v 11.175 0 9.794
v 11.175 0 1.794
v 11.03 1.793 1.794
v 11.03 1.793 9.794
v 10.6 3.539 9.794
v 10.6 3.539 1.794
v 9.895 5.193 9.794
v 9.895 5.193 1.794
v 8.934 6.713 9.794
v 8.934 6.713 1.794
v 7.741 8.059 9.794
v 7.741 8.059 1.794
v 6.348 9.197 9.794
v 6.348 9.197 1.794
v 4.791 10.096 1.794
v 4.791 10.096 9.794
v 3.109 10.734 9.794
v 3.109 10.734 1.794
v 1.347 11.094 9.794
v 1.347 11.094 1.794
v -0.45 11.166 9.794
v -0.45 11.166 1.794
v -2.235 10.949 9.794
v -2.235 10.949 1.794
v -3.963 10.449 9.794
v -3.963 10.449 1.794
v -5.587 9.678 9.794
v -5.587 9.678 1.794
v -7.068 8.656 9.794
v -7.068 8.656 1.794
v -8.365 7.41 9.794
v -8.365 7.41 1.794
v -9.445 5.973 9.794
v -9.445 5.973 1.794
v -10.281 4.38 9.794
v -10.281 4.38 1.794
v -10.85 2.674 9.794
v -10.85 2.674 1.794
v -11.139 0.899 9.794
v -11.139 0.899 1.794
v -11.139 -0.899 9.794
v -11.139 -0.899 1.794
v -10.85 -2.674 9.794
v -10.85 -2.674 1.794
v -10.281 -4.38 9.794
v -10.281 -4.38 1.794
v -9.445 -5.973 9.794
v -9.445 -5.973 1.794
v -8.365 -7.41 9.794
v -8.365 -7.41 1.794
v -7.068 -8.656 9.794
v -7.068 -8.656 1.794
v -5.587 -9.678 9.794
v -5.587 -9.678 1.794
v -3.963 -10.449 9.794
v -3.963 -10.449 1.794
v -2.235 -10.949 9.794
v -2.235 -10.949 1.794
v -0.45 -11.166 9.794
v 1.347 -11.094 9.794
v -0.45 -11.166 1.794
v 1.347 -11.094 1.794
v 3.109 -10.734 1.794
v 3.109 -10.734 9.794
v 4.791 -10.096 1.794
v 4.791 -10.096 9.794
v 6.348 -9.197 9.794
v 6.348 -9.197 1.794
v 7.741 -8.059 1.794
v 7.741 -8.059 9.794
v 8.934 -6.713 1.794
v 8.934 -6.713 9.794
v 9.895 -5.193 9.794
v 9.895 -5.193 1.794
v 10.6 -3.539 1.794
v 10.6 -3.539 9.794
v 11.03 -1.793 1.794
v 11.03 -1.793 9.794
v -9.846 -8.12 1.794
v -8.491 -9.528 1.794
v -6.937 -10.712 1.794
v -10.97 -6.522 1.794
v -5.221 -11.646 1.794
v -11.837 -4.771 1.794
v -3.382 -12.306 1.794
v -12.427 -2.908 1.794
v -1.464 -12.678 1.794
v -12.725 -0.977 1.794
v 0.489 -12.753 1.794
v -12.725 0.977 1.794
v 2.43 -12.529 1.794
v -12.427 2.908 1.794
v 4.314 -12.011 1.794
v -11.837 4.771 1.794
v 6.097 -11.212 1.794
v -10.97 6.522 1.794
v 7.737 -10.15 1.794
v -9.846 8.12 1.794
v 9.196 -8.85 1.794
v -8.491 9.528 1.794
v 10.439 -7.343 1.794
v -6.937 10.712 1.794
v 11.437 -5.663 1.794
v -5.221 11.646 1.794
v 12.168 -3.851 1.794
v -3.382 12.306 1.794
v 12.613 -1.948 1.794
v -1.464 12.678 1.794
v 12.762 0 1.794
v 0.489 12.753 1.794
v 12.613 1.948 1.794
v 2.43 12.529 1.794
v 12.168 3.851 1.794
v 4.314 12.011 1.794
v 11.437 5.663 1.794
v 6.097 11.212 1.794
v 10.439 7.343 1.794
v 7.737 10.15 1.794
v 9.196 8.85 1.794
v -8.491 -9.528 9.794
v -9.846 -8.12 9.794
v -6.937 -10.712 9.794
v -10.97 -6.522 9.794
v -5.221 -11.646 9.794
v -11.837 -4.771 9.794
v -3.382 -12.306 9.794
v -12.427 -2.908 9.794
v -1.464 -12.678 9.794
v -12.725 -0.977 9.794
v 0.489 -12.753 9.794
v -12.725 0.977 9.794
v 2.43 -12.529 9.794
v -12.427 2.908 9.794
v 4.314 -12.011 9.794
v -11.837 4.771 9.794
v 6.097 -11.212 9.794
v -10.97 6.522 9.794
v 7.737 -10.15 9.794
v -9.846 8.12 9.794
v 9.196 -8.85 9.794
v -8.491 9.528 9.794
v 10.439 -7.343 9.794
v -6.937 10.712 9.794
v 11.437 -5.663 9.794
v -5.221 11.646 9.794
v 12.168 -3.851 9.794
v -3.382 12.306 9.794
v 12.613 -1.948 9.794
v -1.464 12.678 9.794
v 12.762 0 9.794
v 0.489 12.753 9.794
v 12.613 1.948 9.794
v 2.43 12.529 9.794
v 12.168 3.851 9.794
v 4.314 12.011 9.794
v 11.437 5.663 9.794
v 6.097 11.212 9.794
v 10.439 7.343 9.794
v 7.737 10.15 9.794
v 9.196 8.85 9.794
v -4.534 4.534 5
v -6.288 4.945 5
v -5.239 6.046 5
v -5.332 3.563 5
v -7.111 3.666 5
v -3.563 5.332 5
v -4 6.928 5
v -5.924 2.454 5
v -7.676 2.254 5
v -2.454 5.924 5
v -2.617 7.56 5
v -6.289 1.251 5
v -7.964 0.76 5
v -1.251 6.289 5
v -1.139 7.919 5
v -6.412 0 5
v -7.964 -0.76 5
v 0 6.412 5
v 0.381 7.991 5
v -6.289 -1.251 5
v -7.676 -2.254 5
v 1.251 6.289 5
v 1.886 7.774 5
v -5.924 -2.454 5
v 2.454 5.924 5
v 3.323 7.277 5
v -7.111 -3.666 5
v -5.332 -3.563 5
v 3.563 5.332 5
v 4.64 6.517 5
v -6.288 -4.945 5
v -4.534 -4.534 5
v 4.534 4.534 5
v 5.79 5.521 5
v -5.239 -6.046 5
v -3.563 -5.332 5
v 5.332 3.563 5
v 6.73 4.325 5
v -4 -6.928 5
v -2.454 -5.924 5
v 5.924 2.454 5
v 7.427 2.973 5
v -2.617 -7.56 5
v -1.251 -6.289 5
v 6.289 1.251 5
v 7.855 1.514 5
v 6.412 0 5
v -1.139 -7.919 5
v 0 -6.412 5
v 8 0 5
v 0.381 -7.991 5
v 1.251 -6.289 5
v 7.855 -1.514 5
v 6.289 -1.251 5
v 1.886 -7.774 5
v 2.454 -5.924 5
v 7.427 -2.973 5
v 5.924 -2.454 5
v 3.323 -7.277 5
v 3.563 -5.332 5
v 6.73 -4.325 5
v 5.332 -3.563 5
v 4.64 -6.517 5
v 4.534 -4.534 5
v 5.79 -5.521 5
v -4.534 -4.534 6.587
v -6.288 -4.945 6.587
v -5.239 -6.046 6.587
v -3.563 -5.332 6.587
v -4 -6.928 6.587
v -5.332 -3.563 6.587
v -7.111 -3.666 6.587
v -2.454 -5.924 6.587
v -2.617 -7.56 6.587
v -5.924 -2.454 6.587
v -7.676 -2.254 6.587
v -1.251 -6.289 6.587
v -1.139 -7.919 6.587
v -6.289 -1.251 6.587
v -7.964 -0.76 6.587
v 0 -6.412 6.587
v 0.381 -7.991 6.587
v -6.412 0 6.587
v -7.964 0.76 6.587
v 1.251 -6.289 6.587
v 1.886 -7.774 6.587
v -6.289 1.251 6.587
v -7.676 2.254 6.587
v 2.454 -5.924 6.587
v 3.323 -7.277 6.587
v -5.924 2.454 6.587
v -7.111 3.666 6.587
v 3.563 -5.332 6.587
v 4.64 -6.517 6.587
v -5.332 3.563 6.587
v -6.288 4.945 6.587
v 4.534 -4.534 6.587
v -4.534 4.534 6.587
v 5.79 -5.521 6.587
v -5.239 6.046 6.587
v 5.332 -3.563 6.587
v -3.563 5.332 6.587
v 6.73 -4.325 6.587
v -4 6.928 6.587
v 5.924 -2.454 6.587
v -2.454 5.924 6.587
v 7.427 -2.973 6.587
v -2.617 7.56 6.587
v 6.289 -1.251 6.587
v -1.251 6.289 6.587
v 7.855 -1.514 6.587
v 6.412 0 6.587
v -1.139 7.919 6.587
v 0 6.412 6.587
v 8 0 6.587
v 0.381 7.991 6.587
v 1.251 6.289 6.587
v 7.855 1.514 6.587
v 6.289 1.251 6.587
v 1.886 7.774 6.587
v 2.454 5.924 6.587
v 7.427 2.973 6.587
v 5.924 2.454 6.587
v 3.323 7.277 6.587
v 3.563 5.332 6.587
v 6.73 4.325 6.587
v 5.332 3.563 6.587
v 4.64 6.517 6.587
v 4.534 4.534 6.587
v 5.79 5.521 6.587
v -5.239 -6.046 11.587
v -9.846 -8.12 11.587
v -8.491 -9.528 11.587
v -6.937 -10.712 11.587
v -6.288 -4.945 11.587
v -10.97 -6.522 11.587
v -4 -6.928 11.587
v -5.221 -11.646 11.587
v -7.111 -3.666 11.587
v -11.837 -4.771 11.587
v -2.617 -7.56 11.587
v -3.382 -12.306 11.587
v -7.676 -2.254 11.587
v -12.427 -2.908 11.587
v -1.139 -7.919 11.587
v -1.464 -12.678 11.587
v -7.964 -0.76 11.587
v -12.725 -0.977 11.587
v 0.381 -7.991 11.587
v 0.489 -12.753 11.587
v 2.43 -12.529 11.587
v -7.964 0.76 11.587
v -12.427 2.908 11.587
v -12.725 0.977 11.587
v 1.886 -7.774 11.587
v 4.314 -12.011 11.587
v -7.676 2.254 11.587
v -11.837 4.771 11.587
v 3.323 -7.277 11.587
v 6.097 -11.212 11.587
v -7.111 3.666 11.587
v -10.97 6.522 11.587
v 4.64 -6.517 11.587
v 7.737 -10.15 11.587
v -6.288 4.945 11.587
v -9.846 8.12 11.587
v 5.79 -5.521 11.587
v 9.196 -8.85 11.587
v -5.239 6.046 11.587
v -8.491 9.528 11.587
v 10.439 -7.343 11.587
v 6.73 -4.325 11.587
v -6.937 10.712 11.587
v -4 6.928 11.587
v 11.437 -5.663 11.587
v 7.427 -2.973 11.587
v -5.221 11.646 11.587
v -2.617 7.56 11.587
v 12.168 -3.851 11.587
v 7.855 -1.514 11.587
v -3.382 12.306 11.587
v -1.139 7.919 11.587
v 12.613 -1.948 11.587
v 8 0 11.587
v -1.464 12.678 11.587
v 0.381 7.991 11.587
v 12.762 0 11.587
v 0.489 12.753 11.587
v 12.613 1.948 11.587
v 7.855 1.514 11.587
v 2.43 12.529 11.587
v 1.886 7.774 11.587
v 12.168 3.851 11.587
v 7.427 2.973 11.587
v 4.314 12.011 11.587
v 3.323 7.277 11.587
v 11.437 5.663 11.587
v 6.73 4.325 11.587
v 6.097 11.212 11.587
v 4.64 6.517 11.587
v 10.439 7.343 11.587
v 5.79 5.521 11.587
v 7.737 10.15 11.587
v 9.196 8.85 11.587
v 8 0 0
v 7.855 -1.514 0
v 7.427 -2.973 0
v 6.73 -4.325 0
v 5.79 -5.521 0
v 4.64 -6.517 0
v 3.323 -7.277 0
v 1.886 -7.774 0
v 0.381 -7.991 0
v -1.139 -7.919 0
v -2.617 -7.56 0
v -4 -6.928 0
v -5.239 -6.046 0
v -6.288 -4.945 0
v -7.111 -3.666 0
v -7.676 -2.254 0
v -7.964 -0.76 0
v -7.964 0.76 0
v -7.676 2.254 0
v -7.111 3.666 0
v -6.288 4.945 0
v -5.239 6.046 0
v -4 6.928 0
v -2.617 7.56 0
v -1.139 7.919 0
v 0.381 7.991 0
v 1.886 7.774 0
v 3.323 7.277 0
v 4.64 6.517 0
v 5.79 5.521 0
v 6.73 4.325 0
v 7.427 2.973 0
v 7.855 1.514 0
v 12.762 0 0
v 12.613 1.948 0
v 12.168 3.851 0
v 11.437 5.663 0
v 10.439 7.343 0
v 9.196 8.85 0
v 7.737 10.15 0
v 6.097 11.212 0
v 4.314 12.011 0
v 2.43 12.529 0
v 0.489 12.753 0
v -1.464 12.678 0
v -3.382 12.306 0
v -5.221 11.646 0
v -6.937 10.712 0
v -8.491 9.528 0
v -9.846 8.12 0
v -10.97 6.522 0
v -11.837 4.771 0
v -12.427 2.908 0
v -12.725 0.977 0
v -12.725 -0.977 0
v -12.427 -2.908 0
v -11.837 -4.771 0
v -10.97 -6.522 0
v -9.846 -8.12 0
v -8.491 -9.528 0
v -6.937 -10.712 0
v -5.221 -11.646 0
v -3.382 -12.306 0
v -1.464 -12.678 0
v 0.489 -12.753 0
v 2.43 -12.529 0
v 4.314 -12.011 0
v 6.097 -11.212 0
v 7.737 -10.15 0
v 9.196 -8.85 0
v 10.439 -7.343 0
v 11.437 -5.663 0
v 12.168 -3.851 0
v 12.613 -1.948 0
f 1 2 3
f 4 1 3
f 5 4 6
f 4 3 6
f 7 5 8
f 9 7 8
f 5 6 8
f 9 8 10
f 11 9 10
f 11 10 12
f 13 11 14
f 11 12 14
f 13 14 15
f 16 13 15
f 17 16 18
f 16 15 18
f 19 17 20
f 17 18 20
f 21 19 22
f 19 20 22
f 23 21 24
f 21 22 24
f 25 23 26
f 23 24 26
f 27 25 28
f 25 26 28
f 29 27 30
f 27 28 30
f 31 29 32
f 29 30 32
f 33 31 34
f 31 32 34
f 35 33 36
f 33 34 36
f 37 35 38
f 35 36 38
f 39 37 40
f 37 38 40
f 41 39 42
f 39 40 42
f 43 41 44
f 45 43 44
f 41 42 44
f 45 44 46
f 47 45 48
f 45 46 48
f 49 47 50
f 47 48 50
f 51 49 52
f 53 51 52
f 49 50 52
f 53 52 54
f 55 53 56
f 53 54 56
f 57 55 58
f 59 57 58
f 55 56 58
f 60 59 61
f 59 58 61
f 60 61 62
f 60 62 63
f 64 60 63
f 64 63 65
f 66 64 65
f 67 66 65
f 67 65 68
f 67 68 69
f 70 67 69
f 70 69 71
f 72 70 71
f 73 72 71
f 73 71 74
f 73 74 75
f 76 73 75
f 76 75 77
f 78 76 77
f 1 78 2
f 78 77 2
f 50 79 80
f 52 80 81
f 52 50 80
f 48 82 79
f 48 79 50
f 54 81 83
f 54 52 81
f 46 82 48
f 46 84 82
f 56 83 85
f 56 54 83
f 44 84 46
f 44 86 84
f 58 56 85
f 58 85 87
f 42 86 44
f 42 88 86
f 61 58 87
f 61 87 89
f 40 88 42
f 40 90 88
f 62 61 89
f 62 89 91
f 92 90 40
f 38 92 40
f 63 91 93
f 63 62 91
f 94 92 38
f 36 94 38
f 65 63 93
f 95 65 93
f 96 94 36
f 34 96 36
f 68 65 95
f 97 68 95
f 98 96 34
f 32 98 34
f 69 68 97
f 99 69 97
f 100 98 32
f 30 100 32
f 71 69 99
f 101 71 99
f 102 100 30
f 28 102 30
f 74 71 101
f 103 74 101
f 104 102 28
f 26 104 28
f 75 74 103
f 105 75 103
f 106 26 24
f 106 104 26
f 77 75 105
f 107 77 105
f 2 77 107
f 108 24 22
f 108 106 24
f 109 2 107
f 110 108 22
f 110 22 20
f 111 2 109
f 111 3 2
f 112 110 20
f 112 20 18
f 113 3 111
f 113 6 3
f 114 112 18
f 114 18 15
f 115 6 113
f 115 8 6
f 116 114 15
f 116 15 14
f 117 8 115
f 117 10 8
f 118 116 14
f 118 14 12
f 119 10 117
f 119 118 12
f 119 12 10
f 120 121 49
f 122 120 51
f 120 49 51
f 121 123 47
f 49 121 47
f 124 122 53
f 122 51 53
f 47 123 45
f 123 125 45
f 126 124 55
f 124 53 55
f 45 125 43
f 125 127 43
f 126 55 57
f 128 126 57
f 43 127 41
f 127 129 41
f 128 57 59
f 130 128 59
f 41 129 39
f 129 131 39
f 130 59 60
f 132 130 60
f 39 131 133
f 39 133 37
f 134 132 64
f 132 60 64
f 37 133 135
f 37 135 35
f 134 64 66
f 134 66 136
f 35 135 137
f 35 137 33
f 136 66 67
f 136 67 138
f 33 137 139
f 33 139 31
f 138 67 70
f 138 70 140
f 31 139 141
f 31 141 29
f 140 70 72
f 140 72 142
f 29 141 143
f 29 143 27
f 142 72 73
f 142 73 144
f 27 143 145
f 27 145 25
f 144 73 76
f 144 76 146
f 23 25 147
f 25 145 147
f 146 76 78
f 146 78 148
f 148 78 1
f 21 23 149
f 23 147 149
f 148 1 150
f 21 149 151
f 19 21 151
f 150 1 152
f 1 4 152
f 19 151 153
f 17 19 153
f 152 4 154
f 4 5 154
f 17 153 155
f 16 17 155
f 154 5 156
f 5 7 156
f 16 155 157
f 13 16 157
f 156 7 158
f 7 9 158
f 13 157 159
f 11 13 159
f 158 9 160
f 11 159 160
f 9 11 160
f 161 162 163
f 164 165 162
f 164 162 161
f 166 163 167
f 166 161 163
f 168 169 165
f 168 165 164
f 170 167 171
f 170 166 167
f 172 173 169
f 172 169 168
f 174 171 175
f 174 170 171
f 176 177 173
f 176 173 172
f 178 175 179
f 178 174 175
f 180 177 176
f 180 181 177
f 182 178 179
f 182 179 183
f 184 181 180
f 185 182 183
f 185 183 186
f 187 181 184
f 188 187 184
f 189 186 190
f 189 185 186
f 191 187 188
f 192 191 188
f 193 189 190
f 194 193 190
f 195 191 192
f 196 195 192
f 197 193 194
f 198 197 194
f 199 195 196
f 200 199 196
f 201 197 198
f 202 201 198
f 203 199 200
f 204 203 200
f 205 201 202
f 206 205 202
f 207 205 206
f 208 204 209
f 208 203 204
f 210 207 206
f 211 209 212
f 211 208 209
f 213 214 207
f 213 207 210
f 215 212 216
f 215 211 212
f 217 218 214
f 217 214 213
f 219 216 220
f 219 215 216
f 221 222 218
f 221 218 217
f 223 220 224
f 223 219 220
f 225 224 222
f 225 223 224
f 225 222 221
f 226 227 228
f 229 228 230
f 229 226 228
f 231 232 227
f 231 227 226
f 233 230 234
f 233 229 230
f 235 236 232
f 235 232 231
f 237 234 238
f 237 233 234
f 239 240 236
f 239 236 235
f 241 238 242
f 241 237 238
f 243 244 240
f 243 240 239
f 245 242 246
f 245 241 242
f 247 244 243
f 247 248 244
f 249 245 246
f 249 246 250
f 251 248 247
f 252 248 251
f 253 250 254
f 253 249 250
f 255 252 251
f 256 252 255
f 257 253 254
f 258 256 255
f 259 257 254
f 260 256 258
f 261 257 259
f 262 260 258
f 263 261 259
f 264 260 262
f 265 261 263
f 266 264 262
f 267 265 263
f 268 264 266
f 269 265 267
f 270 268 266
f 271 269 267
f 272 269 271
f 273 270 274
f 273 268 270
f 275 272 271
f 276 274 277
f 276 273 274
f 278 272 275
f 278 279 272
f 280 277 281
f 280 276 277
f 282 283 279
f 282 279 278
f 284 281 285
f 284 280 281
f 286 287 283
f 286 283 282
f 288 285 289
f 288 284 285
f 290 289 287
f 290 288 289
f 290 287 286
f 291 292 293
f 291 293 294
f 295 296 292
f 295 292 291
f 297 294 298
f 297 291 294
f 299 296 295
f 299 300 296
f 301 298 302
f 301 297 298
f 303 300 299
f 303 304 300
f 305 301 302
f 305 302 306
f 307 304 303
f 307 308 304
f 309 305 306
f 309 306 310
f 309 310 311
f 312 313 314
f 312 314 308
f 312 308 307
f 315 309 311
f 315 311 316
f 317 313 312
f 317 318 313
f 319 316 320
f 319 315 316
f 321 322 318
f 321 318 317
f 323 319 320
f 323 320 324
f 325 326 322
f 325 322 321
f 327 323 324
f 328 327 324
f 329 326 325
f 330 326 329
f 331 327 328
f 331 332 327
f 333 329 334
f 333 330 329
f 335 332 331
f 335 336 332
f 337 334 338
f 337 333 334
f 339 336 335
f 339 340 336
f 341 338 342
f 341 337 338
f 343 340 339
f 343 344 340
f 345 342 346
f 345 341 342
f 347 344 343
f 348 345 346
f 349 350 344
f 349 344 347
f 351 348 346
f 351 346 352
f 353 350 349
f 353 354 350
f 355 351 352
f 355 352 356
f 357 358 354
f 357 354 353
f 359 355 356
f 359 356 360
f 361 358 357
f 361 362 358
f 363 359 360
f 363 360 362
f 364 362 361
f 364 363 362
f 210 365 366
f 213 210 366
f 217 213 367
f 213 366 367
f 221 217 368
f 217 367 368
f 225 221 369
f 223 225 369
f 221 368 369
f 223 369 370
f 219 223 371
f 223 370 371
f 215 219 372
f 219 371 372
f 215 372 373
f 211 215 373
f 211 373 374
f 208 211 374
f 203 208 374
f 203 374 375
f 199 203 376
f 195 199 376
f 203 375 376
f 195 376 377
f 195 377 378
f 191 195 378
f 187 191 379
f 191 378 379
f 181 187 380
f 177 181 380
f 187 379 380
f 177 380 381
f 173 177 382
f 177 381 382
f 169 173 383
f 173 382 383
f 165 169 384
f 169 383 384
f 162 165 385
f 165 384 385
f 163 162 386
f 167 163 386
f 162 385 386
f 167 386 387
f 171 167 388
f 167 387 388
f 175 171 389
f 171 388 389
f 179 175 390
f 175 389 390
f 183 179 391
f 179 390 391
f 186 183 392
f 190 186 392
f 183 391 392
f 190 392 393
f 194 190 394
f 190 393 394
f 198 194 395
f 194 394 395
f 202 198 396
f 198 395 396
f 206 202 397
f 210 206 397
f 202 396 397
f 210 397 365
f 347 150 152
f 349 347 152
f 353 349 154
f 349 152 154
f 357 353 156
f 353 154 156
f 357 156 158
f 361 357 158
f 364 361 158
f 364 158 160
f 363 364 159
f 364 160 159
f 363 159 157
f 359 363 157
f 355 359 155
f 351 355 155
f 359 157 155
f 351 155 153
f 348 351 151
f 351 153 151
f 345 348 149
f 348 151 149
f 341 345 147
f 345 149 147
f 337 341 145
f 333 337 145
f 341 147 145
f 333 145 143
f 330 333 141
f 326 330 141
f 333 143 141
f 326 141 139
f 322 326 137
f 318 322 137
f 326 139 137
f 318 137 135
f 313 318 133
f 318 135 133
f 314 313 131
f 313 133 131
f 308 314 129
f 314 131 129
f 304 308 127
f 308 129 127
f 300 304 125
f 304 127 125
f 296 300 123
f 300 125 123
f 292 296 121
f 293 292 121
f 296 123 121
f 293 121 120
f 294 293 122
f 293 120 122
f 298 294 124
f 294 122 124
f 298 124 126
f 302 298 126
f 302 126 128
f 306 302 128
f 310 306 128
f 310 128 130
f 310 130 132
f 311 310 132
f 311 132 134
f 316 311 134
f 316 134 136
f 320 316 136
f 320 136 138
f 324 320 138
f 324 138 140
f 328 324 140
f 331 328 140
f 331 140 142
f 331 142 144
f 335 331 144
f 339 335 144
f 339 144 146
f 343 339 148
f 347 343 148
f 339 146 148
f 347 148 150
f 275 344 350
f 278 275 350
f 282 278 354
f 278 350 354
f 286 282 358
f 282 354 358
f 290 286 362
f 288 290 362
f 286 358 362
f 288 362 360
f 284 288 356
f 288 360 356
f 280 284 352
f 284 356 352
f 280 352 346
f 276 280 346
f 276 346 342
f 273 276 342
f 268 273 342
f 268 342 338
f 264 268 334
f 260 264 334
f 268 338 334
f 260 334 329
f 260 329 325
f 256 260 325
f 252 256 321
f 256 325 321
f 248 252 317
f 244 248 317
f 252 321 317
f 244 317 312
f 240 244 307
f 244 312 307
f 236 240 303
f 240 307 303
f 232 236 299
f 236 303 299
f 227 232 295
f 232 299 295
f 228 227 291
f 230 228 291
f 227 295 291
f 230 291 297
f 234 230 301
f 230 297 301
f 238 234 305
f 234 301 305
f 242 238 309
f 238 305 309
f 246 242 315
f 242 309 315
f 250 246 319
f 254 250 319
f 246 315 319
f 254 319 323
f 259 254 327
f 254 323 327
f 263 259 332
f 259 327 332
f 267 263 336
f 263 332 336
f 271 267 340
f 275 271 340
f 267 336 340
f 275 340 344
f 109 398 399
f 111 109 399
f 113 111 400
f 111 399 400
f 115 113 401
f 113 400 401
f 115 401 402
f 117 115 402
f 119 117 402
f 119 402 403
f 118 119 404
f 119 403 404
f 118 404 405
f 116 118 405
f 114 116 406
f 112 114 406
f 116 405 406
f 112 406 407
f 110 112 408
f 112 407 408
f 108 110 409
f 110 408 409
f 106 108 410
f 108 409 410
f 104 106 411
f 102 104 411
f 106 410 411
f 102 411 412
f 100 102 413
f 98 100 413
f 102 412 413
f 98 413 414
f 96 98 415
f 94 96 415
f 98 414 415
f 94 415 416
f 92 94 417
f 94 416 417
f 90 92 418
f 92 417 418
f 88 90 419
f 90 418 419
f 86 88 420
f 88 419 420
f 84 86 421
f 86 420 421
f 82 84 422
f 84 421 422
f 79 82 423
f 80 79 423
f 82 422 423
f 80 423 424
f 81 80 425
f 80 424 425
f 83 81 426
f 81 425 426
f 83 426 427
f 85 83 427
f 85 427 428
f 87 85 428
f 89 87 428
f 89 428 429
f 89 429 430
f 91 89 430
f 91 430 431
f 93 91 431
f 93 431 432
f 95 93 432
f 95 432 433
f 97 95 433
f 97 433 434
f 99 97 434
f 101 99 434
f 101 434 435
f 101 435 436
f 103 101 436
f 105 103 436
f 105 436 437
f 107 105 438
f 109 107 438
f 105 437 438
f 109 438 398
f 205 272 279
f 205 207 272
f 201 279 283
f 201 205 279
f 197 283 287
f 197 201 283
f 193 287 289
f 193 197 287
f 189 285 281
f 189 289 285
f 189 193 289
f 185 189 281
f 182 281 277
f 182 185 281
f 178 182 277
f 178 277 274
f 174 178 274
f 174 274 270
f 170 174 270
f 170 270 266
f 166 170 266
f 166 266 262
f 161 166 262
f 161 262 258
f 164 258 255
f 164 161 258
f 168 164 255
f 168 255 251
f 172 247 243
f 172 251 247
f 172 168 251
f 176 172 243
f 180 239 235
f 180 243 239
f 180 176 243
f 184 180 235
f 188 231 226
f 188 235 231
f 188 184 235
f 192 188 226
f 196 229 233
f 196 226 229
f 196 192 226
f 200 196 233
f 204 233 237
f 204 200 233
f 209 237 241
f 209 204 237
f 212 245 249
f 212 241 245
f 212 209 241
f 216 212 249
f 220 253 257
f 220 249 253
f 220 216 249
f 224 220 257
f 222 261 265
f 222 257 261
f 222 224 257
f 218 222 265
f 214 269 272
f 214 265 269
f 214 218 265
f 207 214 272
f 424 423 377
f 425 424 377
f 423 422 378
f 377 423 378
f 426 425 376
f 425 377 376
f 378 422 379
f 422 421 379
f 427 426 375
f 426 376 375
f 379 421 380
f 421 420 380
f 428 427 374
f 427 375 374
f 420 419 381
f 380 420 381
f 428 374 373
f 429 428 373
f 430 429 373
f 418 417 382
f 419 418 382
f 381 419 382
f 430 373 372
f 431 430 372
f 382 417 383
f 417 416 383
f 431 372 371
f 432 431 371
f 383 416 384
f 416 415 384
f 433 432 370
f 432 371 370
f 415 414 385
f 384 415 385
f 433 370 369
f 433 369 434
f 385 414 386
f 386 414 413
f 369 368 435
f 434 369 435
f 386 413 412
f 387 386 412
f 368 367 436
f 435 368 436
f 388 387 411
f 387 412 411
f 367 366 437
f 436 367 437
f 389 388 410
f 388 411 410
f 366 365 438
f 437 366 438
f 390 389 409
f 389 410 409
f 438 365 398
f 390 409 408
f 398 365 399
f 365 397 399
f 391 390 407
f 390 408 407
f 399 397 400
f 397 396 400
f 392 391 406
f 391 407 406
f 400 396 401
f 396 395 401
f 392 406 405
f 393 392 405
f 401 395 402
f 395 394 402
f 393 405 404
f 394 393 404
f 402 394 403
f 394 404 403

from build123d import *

# Parameters (mm, degrees)
F0_R     = 12.7625
F0_R_2   = 6.4125
F1_DEPTH = 1.793748
F2_R     = 11.175
F2_R_2   = 6.4125
F3_DEPTH = 8
F4_R     = 12.7625
F4_R_2   = 6.4125
F5_DEPTH = 1.793748
F6_R     = 8
F7_DEPTH = 5
F8_R     = 8
F9_DEPTH = 5


with BuildPart() as f1:
    # F0 (on Top) → F1 (new body)
    with BuildSketch(Plane.XY):
        Circle(F0_R)
        Circle(F0_R_2, mode=Mode.SUBTRACT)
    extrude(amount=F1_DEPTH)

    # F2 (on face) → F3 (join)
    with BuildSketch(Plane.XY.offset(1.793748)):
        Circle(F2_R)
        Circle(F2_R_2, mode=Mode.SUBTRACT)
    extrude(amount=F3_DEPTH)

    # F4 (on face) → F5 (join)
    with BuildSketch(Plane.XY.offset(9.793748)):
        Circle(F4_R)
        Circle(F4_R_2, mode=Mode.SUBTRACT)
    extrude(amount=F5_DEPTH)

    # F6 (on face) → F7 (cut)
    with BuildSketch(Plane(origin=(0, 0, 0), x_dir=(1, 0, 0), z_dir=(0, 0, -1))):
        Circle(F6_R)
    extrude(amount=-F7_DEPTH, mode=Mode.SUBTRACT)

    # F8 (on face) → F9 (cut)
    with BuildSketch(Plane.XY.offset(11.587496)):
        Circle(F8_R)
    extrude(amount=-F9_DEPTH, mode=Mode.SUBTRACT)


solid = f1.part
